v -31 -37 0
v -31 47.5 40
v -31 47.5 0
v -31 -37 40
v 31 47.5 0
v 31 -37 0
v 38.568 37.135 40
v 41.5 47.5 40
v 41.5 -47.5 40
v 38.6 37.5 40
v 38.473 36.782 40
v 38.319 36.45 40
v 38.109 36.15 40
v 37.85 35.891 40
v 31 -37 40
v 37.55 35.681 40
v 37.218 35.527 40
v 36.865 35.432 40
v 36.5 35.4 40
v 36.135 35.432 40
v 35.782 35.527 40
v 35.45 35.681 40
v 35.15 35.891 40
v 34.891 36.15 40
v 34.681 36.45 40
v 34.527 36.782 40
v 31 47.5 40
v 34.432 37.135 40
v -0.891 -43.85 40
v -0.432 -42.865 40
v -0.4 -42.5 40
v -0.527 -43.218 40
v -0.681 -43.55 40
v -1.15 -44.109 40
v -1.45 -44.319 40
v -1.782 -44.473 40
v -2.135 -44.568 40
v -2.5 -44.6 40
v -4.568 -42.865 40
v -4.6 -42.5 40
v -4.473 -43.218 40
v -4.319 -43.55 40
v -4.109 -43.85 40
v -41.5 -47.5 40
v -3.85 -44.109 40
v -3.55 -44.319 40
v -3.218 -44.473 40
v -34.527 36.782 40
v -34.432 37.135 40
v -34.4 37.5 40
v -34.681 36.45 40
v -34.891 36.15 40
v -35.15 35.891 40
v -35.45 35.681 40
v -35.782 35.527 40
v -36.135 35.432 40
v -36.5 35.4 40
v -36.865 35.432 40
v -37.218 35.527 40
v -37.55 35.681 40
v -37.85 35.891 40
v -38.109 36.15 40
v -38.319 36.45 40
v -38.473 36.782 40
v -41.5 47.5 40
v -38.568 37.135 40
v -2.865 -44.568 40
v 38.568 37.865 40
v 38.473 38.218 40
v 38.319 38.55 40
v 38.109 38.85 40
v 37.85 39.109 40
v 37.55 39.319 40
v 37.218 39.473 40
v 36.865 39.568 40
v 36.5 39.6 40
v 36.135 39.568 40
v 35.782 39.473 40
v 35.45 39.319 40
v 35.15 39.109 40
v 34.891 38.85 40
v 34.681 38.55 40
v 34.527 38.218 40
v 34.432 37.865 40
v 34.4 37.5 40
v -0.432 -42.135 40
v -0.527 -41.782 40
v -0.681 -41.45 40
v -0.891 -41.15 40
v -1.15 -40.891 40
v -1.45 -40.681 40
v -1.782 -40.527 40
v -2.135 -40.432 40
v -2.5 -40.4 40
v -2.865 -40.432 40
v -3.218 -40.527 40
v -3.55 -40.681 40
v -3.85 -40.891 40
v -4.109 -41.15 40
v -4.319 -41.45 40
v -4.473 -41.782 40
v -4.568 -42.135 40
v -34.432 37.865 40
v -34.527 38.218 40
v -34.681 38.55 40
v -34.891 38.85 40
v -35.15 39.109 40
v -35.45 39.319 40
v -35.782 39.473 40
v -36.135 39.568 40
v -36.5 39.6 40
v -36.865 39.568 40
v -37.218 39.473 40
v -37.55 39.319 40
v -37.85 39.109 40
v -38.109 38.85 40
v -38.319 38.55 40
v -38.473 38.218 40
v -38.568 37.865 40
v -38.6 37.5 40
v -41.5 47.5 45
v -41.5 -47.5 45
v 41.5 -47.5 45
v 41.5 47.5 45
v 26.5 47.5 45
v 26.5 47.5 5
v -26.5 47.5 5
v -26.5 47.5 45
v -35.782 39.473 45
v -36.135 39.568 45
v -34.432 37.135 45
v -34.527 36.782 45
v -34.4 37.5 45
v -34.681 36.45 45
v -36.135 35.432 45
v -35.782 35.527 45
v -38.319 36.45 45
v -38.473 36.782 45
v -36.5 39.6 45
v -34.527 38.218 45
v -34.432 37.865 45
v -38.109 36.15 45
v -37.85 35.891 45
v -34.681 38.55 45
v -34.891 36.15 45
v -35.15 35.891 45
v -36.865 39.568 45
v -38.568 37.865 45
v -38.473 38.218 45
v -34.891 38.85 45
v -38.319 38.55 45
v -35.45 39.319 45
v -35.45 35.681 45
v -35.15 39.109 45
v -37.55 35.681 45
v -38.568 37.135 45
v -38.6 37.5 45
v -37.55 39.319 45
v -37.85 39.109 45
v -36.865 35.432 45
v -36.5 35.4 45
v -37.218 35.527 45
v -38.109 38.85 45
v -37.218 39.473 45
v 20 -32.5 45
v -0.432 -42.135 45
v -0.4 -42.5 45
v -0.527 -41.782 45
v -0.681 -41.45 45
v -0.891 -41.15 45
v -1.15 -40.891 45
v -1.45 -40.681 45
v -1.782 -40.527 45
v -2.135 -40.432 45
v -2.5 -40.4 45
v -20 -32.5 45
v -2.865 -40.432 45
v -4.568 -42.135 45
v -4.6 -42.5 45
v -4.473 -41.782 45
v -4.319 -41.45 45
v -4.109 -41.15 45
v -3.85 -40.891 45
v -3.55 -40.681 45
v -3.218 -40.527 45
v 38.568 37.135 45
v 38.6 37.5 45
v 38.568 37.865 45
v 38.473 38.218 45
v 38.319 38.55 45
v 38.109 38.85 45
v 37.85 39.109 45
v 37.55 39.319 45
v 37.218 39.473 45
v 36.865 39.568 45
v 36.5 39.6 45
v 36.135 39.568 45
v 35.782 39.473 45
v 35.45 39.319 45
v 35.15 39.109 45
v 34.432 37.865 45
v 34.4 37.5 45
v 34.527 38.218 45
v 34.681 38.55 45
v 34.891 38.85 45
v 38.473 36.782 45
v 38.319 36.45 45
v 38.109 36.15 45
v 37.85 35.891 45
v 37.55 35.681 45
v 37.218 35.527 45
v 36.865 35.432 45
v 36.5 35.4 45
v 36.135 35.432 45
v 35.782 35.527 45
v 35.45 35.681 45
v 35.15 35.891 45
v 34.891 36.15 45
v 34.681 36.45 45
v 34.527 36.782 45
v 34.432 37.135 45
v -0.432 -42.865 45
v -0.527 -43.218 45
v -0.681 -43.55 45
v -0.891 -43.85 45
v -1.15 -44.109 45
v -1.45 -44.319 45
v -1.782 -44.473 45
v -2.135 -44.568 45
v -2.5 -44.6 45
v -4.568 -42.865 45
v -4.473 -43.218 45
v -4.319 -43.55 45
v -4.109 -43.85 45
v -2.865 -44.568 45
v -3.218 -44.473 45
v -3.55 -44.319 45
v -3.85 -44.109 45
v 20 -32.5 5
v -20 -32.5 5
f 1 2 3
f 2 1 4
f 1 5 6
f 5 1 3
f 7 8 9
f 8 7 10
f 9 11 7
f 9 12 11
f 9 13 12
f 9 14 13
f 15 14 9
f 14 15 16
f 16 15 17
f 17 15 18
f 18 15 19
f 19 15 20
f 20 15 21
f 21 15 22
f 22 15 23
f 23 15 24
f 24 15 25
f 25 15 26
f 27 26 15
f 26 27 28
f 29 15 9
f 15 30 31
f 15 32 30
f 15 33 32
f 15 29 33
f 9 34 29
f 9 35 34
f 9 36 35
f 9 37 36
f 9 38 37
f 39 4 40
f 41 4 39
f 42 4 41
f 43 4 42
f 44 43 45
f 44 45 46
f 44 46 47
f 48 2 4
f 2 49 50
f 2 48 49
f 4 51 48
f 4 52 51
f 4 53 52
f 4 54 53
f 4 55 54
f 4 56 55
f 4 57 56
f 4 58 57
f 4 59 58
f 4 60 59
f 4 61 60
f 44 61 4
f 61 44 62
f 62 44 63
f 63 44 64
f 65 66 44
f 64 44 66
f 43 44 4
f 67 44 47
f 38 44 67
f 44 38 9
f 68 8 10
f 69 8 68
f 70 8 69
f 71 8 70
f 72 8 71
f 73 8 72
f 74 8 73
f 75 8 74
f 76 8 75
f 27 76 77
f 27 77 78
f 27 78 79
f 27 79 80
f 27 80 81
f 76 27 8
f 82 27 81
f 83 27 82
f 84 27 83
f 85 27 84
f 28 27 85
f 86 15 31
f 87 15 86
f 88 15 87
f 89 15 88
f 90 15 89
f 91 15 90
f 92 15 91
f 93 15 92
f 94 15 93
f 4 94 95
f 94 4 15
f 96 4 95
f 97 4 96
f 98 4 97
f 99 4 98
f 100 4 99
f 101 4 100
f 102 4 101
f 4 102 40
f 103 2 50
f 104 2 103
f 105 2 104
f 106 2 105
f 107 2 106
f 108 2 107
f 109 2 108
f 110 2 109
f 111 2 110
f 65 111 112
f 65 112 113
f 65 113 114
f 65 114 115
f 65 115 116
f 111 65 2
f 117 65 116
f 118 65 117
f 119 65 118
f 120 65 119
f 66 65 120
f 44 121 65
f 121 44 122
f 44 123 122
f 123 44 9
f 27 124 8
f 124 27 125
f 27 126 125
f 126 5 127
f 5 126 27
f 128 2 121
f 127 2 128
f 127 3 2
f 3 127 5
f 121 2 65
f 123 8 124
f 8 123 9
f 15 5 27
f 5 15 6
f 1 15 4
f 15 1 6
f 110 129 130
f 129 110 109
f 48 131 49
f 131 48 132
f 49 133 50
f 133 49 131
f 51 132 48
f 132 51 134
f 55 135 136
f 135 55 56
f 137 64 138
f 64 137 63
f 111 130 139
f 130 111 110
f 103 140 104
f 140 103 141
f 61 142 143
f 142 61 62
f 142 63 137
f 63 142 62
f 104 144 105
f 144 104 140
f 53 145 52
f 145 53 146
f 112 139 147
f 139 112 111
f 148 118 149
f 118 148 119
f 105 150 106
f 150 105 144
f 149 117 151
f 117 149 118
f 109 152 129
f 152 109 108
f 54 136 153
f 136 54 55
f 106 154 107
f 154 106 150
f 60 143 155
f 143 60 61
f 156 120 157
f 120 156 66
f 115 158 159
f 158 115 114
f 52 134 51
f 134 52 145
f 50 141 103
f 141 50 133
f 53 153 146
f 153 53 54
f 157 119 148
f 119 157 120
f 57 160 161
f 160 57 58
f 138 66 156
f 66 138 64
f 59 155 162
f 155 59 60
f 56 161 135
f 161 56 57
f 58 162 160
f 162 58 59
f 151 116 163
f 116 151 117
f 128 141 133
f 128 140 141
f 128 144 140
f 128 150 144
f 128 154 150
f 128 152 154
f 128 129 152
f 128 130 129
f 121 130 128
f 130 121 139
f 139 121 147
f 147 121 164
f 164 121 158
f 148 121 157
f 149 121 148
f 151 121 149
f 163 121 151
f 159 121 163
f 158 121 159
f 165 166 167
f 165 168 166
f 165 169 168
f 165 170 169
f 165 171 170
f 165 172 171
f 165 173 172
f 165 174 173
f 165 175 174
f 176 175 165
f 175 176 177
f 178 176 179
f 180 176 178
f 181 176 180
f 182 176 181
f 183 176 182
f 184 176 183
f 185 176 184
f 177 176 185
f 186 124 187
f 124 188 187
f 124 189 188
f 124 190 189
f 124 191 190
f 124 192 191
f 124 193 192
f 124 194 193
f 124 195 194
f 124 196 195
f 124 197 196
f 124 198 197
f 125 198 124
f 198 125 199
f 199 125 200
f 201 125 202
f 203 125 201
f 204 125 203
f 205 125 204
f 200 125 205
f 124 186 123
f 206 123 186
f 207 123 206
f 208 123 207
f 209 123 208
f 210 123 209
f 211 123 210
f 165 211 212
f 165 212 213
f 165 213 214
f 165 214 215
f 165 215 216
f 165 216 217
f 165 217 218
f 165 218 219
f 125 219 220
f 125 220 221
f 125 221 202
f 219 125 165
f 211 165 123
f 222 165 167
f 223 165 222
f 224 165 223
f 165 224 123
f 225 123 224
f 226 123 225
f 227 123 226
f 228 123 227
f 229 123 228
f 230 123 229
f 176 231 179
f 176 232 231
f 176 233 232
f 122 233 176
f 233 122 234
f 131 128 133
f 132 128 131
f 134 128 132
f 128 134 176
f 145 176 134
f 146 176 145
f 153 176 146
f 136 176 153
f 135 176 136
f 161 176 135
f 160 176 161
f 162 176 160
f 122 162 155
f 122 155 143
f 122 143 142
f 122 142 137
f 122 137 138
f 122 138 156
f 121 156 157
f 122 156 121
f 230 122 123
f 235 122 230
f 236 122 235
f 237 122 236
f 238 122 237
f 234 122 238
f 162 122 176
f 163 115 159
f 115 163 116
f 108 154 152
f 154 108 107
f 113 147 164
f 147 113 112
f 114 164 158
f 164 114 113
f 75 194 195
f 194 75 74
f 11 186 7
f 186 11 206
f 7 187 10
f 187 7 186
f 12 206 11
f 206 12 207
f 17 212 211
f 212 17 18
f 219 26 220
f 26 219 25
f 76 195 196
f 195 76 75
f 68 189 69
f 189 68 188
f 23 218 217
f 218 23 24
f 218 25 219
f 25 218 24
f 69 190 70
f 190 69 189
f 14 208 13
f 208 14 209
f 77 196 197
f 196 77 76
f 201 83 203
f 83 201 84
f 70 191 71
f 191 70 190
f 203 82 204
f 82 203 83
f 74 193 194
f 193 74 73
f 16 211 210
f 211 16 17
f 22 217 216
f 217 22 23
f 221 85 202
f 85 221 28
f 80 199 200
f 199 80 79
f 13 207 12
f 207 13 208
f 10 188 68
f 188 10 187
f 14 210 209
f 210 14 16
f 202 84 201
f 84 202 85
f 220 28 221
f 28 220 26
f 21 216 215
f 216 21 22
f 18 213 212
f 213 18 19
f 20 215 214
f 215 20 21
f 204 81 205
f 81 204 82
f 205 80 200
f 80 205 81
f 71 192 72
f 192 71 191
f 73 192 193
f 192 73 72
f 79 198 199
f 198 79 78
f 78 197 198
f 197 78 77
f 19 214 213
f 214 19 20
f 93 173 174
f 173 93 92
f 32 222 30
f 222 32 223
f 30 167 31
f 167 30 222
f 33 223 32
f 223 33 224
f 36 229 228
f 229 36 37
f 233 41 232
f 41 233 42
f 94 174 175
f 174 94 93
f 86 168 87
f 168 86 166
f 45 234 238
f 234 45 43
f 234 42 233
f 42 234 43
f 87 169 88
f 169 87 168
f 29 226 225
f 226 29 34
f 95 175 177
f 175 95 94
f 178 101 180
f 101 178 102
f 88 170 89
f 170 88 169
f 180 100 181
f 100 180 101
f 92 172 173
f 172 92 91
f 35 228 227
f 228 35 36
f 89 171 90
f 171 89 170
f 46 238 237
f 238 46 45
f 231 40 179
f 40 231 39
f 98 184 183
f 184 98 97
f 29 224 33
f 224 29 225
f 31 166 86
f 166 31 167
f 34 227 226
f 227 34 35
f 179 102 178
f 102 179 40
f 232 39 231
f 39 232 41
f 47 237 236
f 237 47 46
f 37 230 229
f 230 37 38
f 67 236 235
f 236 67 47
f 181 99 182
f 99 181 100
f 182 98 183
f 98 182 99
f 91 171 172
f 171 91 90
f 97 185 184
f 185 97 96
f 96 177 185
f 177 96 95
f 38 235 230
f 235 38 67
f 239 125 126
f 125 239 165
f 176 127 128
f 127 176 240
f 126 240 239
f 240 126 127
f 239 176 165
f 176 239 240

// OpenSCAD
//
//  HamptonBayCeilingFanWallMount.scad
//
//  EvilTeach
//
//  1/10/2015
//



// Width of the controller at the top of the box
controlTopWidth = 53.0;

// Width of the controller at the bottom of the box
controlBotWidth = 40.0;

// Height of the box
controlDepth    = 80.0;

//Thickness of the controller
controlHeight   = 40.0;

// width of the part that the screw holes are in.
wallWidth       = 15.0;



// Make a cube big enough to hold the controller, and enough space for screwholes
cubeWidth  = wallWidth + controlTopWidth + wallWidth;
cubeDepth  = controlDepth + wallWidth;
cubeHeight =  controlHeight + 5;
module base_block()
{
    color("cyan")
        cube([cubeWidth, cubeDepth, cubeHeight]);
}


module trapezoid(width_base, width_top,height,thickness) 
{

  linear_extrude(height = thickness) 
      polygon(points=[[0,0],
                      [width_base,0],
                      [width_base-(width_base-width_top)/2,height],
                      [(width_base-width_top)/2,height]], 
              paths=[[0,1,2,3]]); 
  
}


// Make a controller bottom piece to subtract out of the cube.
module controller_insert()
{
    color("Yellow")
    translate([cubeWidth / 2.0 - controlTopWidth / 2.0, 0, 0])
            trapezoid(controlTopWidth, controlBotWidth, controlDepth, controlHeight);
}



// Make a model to cut away the extra material, and put in screw holes.
cutaway = wallWidth * .7;
module screw_holes()
{
    color("lime")
        translate([0, 0, 5])
        cube([cutaway, cubeDepth, cubeHeight - 5]);
    
    color("pink")
        translate([cubeWidth - cutaway, 0, 5])
            cube([cutaway, cubeDepth, cubeHeight - 5]);

    color("blue")
        translate([0, cubeDepth - cutaway, 5])
            cube([cubeWidth, cutaway, cubeHeight - 5]);

    color("red")
        translate([5, 10, 0])
            cylinder(r = 2.1, h = 5.0, $fn = 36);

    color("red")
        translate([cubeWidth - 5, 10, 0])
            cylinder(r = 2.1, h = 5.0, $fn = 36);

    color("red")
        translate([(cubeWidth - 5) / 2, cubeDepth - 5, 0])
            cylinder(r = 2.1, h = 5.0, $fn = 36);
}



module main()
{
    // Center it
    translate([-cubeWidth / 2, cubeDepth / 2, cubeHeight])
        // Minimize the need for support material
        rotate([180, 0, 0])
            difference()
            {
                base_block();
                controller_insert();
                screw_holes();
            }
}


main();
